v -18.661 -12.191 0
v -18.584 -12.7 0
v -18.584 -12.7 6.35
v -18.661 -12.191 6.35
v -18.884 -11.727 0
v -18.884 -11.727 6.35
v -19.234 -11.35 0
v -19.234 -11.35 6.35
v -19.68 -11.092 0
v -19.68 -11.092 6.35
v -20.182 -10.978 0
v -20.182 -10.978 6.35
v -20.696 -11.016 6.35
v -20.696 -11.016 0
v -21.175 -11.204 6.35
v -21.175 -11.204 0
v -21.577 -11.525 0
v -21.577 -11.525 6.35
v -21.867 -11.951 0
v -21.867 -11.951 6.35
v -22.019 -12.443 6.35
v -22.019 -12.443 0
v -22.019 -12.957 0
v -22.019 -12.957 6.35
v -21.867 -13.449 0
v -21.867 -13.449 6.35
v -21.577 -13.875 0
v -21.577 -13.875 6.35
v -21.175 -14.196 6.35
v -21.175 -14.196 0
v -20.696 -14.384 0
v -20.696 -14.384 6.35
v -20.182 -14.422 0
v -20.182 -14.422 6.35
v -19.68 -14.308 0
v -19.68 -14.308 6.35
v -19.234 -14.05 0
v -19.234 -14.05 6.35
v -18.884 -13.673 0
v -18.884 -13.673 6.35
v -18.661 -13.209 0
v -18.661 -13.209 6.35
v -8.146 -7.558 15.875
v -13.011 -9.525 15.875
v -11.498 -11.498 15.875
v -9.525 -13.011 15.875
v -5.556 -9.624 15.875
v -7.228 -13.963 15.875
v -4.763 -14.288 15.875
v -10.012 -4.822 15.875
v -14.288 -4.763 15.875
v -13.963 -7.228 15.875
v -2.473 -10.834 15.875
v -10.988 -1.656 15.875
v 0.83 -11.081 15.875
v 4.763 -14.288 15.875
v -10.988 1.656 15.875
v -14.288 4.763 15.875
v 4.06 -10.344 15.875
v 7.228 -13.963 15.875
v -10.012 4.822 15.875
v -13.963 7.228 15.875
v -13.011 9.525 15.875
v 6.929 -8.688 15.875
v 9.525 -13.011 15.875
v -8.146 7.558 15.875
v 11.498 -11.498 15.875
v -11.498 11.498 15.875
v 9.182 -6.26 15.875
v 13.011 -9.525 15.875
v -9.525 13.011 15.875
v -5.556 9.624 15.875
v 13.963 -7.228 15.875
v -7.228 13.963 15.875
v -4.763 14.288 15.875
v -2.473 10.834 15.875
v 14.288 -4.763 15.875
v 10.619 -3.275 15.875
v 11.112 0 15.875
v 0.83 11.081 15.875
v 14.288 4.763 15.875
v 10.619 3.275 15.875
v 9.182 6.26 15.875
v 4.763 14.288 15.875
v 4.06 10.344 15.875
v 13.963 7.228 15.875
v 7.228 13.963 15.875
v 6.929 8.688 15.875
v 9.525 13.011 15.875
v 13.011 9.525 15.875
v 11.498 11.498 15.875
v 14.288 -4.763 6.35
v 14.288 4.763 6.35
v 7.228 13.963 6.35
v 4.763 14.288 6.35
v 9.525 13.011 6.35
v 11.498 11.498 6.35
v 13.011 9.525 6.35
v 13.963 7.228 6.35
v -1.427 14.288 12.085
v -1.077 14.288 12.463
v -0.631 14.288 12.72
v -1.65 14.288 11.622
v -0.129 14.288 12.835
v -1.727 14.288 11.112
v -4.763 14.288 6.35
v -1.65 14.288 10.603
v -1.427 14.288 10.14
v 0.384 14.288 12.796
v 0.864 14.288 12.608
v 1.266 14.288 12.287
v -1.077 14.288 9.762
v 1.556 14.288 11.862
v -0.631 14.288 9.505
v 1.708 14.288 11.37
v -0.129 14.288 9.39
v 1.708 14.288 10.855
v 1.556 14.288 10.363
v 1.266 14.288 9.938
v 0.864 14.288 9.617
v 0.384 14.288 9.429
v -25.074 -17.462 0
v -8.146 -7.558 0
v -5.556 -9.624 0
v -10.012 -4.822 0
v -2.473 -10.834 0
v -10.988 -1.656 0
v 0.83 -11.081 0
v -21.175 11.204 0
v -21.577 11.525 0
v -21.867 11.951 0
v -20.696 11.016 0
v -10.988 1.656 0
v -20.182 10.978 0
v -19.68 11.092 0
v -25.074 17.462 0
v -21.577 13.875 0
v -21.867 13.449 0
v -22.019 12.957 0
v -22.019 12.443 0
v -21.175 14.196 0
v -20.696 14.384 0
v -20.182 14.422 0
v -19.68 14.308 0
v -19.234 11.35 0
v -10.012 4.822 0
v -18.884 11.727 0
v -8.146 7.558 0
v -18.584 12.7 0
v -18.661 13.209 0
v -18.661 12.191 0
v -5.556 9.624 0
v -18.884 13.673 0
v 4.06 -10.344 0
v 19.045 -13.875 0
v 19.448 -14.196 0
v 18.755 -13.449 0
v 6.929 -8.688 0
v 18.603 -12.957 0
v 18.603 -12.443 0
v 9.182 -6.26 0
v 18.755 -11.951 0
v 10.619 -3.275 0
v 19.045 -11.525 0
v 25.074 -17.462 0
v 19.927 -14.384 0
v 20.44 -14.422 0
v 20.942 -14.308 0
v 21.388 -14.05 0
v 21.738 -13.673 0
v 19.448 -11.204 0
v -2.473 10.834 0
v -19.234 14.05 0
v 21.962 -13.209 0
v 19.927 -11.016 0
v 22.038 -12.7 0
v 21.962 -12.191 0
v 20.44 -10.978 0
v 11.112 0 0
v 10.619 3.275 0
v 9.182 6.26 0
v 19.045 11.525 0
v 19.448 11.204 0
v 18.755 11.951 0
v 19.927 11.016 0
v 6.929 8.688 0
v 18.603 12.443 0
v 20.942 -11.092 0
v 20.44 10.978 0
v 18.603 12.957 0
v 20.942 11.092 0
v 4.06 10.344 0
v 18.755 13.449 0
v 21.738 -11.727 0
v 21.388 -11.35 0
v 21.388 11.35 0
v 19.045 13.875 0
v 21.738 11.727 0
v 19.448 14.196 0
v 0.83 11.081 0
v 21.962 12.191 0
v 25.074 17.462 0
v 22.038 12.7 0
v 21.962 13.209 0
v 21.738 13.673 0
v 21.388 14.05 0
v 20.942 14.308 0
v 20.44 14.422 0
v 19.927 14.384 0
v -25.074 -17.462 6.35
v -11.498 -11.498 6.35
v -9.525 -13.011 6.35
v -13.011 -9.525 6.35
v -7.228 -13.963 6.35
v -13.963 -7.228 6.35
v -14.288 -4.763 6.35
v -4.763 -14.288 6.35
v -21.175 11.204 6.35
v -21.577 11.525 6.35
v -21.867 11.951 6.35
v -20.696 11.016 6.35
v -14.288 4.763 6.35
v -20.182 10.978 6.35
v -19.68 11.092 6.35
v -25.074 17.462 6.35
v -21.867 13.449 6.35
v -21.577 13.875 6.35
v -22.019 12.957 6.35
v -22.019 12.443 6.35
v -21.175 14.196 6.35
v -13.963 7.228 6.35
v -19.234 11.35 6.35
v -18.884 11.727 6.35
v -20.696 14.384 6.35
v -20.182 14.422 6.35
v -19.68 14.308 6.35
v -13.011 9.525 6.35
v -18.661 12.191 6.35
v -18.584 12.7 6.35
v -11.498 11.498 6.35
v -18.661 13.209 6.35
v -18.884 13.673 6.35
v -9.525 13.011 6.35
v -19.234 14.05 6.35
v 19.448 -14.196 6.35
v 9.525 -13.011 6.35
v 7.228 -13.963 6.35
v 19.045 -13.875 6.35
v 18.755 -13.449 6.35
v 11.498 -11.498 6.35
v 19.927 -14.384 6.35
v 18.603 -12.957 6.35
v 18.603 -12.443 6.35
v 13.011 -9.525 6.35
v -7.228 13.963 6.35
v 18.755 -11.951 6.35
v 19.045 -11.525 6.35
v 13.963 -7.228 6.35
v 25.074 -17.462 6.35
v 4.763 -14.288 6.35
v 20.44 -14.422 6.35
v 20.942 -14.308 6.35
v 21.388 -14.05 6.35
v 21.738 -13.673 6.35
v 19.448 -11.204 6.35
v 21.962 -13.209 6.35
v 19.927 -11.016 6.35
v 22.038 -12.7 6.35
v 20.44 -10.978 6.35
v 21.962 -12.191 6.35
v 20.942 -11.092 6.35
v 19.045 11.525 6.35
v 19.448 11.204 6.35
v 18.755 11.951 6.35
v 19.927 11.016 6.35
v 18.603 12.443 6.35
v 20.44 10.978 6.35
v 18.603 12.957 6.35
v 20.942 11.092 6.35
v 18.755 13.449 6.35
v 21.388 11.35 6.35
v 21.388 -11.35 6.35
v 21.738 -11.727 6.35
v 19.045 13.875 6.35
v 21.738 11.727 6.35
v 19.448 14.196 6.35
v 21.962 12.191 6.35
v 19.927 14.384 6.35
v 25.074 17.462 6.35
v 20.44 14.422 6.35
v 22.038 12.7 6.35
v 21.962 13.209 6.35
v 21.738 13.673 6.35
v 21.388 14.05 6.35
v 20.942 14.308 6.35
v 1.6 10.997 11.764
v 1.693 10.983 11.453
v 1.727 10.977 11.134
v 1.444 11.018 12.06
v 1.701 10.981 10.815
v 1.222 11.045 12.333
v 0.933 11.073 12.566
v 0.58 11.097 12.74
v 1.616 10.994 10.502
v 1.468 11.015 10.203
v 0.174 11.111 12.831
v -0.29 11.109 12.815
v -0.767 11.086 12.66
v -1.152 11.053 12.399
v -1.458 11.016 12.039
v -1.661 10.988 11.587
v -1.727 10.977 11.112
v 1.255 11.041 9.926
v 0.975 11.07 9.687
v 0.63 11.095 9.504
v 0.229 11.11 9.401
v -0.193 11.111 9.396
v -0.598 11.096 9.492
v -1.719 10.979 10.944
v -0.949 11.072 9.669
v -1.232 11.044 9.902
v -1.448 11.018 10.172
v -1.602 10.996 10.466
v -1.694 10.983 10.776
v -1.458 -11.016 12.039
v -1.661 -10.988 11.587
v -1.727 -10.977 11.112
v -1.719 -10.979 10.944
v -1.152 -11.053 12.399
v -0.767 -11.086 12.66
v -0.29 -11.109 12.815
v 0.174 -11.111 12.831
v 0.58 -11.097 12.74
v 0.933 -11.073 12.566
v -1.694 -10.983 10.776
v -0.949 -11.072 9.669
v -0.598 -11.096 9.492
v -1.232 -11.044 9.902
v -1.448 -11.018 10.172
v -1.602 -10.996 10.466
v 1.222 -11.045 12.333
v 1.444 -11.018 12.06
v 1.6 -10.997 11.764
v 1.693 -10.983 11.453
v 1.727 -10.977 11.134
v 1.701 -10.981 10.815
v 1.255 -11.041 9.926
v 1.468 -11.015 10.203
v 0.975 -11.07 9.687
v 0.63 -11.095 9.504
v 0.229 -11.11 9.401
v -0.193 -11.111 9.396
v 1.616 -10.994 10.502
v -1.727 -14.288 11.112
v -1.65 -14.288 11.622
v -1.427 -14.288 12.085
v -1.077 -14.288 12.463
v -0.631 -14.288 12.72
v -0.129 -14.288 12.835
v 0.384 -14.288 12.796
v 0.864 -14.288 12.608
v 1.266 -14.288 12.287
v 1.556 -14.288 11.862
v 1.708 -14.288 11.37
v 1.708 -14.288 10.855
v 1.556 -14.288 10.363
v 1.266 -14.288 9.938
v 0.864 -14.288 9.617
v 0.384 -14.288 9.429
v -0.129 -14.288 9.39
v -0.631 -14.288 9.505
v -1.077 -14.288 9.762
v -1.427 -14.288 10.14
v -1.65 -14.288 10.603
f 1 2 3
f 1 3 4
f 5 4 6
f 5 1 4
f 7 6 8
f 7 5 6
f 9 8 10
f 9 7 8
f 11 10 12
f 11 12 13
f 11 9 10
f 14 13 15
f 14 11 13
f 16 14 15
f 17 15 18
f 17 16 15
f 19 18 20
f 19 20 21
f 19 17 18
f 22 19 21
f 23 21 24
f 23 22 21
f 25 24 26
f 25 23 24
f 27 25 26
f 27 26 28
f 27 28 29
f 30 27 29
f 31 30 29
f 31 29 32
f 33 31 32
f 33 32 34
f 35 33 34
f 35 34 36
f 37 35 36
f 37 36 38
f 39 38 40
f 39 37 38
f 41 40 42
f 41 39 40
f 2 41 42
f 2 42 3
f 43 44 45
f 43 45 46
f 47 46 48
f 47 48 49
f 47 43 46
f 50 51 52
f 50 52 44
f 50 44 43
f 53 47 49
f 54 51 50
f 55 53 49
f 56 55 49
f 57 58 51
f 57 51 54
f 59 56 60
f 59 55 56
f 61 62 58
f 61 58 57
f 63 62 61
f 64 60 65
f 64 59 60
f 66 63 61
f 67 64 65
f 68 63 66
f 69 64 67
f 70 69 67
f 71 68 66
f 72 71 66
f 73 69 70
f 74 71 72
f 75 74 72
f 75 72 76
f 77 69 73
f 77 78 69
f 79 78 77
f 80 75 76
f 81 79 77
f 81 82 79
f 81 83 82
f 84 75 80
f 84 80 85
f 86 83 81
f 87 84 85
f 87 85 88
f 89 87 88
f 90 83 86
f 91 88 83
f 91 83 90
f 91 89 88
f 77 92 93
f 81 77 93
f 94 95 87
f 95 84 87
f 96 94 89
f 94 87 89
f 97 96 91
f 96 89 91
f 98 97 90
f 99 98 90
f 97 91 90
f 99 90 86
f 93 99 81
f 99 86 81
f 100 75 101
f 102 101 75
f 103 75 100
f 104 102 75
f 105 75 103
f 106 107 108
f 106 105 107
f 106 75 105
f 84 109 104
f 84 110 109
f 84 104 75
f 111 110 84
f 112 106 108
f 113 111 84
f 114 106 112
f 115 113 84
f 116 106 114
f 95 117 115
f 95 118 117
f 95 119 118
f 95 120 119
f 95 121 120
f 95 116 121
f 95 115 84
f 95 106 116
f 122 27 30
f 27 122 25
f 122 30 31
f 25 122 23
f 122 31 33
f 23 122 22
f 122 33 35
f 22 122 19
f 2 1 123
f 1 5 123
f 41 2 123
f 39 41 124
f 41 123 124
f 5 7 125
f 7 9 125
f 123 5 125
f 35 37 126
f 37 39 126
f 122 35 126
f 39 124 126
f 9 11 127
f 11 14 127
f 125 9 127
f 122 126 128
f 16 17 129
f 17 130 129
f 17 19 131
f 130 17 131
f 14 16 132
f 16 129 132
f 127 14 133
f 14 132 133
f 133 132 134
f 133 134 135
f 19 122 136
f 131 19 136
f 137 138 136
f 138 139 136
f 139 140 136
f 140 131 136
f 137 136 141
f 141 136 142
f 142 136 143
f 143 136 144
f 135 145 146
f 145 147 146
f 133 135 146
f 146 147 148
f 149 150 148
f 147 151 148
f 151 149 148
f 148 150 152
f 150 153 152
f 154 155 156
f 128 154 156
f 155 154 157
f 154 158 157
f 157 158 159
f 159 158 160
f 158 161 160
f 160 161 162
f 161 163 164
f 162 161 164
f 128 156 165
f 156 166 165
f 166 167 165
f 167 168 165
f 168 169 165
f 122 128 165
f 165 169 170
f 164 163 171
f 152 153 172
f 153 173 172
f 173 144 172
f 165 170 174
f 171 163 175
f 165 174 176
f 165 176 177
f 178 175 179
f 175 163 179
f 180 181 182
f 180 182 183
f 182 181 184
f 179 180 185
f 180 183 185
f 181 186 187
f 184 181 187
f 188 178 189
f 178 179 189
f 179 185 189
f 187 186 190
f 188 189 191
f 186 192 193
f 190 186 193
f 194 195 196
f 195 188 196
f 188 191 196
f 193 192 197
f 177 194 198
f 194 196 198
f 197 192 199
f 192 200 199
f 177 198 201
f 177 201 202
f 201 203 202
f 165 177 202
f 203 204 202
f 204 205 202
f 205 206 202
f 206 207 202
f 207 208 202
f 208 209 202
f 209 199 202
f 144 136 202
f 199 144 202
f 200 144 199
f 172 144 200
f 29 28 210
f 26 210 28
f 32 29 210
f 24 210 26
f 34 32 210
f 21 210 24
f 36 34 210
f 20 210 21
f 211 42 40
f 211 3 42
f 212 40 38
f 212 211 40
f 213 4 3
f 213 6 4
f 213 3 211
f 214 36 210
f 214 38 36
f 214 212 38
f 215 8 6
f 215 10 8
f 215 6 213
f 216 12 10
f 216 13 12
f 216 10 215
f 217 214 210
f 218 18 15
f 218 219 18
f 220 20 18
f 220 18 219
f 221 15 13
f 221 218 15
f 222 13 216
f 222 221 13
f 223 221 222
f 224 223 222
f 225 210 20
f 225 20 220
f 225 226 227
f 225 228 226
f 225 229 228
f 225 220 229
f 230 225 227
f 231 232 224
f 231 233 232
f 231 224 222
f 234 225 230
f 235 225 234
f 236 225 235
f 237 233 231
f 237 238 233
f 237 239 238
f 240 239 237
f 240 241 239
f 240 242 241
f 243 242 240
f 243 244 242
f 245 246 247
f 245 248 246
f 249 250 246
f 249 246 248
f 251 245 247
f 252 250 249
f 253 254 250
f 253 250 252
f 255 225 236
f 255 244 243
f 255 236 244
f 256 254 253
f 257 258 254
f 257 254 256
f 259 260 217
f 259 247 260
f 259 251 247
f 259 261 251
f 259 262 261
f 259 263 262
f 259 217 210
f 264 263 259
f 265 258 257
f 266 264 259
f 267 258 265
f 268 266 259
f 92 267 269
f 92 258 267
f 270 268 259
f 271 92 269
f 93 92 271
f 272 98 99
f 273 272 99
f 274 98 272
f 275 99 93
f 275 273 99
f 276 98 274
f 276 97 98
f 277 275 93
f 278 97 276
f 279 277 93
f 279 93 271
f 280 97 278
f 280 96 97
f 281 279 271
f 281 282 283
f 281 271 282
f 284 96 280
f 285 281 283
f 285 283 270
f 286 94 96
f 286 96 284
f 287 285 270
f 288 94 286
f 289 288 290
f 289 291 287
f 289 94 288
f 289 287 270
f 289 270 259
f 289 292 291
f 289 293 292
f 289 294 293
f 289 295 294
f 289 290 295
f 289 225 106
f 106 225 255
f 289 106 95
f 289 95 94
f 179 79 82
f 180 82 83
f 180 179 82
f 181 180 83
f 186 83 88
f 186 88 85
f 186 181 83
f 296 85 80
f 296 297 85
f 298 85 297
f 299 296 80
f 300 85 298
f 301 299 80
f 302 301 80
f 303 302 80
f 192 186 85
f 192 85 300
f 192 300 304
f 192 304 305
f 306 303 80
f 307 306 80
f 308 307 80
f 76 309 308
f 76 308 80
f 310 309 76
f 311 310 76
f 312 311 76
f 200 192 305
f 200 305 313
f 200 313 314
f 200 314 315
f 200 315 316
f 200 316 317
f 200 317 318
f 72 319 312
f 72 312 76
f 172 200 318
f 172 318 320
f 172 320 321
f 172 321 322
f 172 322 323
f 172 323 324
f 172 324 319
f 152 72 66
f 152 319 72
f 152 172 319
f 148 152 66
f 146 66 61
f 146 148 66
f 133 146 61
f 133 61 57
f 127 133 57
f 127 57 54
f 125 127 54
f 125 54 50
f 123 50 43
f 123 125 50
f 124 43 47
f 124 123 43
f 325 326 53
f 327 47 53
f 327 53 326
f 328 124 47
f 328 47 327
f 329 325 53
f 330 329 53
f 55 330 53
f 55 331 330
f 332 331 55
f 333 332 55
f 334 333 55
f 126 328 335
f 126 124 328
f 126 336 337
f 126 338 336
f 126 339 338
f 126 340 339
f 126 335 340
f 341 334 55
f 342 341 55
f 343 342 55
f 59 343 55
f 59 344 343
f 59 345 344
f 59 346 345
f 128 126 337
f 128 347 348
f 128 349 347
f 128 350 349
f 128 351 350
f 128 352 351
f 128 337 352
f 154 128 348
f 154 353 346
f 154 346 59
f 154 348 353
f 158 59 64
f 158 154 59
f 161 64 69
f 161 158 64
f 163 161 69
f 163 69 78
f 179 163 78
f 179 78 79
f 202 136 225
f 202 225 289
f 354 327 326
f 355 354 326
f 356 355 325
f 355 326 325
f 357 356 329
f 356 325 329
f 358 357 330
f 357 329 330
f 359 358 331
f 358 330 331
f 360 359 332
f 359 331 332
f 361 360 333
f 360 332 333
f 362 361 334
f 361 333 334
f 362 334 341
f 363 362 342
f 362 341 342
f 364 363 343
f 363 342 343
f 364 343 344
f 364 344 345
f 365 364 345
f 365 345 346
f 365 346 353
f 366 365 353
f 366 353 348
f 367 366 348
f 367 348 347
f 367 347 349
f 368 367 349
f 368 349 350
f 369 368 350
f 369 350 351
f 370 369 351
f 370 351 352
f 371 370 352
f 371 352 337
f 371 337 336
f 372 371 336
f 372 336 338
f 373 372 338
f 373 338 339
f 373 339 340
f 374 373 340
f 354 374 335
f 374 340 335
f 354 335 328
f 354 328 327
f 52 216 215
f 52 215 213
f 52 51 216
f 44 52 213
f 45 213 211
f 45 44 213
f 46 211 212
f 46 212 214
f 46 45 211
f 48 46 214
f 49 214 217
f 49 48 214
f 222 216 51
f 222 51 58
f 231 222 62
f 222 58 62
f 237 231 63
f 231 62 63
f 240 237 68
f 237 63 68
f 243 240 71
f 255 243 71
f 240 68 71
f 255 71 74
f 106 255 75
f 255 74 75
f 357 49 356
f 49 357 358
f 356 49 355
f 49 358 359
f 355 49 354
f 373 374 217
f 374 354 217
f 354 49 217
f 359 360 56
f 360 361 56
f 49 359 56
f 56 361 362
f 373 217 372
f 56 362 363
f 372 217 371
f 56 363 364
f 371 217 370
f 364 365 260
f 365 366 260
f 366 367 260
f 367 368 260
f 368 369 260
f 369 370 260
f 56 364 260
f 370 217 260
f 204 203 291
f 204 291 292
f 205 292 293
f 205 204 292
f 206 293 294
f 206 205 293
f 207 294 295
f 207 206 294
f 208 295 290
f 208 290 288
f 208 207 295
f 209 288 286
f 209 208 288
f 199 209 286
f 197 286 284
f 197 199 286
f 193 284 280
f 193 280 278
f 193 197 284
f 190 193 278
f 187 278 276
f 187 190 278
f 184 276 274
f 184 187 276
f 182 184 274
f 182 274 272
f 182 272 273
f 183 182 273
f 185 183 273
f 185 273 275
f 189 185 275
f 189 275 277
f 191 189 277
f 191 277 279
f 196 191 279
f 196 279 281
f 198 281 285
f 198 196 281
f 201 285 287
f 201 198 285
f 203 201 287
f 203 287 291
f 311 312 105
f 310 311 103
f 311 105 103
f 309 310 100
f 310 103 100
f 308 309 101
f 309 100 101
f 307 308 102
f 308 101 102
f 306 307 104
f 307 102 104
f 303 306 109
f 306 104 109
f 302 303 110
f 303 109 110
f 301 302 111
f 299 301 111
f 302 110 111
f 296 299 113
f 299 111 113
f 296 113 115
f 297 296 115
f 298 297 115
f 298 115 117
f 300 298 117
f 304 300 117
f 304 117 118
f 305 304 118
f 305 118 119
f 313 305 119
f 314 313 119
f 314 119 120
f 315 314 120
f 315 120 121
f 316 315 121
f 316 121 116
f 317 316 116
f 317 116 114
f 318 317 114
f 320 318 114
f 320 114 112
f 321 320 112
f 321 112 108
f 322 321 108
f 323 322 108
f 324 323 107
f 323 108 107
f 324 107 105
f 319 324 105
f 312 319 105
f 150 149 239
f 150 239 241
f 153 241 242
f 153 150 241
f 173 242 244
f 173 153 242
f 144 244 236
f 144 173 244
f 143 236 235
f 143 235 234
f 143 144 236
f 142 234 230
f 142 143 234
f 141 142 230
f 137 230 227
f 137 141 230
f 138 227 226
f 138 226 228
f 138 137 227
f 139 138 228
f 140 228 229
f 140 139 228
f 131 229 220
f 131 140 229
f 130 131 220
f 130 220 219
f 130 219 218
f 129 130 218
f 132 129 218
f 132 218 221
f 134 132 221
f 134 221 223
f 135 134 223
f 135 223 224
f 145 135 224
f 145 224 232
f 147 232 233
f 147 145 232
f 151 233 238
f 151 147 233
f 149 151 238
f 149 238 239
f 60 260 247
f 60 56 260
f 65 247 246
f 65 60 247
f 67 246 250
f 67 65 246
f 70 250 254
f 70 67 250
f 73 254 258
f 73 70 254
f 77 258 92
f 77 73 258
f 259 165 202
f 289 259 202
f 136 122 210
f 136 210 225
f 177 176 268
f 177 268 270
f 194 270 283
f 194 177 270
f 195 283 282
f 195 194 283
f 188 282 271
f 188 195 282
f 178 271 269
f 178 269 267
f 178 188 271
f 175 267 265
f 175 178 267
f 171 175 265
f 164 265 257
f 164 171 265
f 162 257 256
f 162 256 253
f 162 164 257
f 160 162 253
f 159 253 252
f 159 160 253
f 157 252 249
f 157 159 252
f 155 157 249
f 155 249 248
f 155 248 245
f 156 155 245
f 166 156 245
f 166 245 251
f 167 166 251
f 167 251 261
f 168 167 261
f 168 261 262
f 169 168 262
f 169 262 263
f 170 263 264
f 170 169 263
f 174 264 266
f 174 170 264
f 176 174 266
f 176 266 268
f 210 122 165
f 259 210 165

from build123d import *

# Parameters (mm, degrees)
F0_W     = 50.147576
F0_H     = 34.925
F0_R     = 1.7272
F0_R_2   = 11.1125
F1_DEPTH = 6.35
F2_W     = 28.575
F2_H     = 28.575
F2_R     = 11.1125
F3_DEPTH = 9.525
F4_R     = 1.7272
F5_DEPTH = 28.575
F6_R     = 9.525


with BuildPart() as f1:
    # F0 (on Top) → F1 (new body)
    with BuildSketch(Plane.XY):
        Rectangle(F0_W, F0_H)
        with Locations((-20.311288, -12.7)):
            Circle(F0_R, mode=Mode.SUBTRACT)
        with Locations((20.311288, -12.7)):
            Circle(F0_R, mode=Mode.SUBTRACT)
        with Locations((-20.311288, 12.7)):
            Circle(F0_R, mode=Mode.SUBTRACT)
        Circle(F0_R_2, mode=Mode.SUBTRACT)
        with Locations((20.311288, 12.7)):
            Circle(F0_R, mode=Mode.SUBTRACT)
    extrude(amount=F1_DEPTH)

    # F2 (on face) → F3 (join)
    with BuildSketch(Plane.XY.offset(6.35)):
        Rectangle(F2_W, F2_H)
        Circle(F2_R, mode=Mode.SUBTRACT)
    extrude(amount=F3_DEPTH)

    # F4 (on face) → F5 (cut, through all)
    with BuildSketch(Plane(origin=(0, 14.2875, 0), x_dir=(-1, 0, 0), z_dir=(0, 1, 0))):
        with Locations((0, 11.1125)):
            Circle(F4_R)
    extrude(amount=-F5_DEPTH, mode=Mode.SUBTRACT)

    # F6
    f6_edges = [f1.edges().sort_by_distance(p)[0] for p in [
        (-14.2875, -14.2875, 11.1125),
        (14.2875, -14.2875, 11.1125),
        (14.2875, 14.2875, 11.1125),
        (-14.2875, 14.2875, 11.1125),
    ]]
    fillet(f6_edges, radius=F6_R)


solid = f1.part
